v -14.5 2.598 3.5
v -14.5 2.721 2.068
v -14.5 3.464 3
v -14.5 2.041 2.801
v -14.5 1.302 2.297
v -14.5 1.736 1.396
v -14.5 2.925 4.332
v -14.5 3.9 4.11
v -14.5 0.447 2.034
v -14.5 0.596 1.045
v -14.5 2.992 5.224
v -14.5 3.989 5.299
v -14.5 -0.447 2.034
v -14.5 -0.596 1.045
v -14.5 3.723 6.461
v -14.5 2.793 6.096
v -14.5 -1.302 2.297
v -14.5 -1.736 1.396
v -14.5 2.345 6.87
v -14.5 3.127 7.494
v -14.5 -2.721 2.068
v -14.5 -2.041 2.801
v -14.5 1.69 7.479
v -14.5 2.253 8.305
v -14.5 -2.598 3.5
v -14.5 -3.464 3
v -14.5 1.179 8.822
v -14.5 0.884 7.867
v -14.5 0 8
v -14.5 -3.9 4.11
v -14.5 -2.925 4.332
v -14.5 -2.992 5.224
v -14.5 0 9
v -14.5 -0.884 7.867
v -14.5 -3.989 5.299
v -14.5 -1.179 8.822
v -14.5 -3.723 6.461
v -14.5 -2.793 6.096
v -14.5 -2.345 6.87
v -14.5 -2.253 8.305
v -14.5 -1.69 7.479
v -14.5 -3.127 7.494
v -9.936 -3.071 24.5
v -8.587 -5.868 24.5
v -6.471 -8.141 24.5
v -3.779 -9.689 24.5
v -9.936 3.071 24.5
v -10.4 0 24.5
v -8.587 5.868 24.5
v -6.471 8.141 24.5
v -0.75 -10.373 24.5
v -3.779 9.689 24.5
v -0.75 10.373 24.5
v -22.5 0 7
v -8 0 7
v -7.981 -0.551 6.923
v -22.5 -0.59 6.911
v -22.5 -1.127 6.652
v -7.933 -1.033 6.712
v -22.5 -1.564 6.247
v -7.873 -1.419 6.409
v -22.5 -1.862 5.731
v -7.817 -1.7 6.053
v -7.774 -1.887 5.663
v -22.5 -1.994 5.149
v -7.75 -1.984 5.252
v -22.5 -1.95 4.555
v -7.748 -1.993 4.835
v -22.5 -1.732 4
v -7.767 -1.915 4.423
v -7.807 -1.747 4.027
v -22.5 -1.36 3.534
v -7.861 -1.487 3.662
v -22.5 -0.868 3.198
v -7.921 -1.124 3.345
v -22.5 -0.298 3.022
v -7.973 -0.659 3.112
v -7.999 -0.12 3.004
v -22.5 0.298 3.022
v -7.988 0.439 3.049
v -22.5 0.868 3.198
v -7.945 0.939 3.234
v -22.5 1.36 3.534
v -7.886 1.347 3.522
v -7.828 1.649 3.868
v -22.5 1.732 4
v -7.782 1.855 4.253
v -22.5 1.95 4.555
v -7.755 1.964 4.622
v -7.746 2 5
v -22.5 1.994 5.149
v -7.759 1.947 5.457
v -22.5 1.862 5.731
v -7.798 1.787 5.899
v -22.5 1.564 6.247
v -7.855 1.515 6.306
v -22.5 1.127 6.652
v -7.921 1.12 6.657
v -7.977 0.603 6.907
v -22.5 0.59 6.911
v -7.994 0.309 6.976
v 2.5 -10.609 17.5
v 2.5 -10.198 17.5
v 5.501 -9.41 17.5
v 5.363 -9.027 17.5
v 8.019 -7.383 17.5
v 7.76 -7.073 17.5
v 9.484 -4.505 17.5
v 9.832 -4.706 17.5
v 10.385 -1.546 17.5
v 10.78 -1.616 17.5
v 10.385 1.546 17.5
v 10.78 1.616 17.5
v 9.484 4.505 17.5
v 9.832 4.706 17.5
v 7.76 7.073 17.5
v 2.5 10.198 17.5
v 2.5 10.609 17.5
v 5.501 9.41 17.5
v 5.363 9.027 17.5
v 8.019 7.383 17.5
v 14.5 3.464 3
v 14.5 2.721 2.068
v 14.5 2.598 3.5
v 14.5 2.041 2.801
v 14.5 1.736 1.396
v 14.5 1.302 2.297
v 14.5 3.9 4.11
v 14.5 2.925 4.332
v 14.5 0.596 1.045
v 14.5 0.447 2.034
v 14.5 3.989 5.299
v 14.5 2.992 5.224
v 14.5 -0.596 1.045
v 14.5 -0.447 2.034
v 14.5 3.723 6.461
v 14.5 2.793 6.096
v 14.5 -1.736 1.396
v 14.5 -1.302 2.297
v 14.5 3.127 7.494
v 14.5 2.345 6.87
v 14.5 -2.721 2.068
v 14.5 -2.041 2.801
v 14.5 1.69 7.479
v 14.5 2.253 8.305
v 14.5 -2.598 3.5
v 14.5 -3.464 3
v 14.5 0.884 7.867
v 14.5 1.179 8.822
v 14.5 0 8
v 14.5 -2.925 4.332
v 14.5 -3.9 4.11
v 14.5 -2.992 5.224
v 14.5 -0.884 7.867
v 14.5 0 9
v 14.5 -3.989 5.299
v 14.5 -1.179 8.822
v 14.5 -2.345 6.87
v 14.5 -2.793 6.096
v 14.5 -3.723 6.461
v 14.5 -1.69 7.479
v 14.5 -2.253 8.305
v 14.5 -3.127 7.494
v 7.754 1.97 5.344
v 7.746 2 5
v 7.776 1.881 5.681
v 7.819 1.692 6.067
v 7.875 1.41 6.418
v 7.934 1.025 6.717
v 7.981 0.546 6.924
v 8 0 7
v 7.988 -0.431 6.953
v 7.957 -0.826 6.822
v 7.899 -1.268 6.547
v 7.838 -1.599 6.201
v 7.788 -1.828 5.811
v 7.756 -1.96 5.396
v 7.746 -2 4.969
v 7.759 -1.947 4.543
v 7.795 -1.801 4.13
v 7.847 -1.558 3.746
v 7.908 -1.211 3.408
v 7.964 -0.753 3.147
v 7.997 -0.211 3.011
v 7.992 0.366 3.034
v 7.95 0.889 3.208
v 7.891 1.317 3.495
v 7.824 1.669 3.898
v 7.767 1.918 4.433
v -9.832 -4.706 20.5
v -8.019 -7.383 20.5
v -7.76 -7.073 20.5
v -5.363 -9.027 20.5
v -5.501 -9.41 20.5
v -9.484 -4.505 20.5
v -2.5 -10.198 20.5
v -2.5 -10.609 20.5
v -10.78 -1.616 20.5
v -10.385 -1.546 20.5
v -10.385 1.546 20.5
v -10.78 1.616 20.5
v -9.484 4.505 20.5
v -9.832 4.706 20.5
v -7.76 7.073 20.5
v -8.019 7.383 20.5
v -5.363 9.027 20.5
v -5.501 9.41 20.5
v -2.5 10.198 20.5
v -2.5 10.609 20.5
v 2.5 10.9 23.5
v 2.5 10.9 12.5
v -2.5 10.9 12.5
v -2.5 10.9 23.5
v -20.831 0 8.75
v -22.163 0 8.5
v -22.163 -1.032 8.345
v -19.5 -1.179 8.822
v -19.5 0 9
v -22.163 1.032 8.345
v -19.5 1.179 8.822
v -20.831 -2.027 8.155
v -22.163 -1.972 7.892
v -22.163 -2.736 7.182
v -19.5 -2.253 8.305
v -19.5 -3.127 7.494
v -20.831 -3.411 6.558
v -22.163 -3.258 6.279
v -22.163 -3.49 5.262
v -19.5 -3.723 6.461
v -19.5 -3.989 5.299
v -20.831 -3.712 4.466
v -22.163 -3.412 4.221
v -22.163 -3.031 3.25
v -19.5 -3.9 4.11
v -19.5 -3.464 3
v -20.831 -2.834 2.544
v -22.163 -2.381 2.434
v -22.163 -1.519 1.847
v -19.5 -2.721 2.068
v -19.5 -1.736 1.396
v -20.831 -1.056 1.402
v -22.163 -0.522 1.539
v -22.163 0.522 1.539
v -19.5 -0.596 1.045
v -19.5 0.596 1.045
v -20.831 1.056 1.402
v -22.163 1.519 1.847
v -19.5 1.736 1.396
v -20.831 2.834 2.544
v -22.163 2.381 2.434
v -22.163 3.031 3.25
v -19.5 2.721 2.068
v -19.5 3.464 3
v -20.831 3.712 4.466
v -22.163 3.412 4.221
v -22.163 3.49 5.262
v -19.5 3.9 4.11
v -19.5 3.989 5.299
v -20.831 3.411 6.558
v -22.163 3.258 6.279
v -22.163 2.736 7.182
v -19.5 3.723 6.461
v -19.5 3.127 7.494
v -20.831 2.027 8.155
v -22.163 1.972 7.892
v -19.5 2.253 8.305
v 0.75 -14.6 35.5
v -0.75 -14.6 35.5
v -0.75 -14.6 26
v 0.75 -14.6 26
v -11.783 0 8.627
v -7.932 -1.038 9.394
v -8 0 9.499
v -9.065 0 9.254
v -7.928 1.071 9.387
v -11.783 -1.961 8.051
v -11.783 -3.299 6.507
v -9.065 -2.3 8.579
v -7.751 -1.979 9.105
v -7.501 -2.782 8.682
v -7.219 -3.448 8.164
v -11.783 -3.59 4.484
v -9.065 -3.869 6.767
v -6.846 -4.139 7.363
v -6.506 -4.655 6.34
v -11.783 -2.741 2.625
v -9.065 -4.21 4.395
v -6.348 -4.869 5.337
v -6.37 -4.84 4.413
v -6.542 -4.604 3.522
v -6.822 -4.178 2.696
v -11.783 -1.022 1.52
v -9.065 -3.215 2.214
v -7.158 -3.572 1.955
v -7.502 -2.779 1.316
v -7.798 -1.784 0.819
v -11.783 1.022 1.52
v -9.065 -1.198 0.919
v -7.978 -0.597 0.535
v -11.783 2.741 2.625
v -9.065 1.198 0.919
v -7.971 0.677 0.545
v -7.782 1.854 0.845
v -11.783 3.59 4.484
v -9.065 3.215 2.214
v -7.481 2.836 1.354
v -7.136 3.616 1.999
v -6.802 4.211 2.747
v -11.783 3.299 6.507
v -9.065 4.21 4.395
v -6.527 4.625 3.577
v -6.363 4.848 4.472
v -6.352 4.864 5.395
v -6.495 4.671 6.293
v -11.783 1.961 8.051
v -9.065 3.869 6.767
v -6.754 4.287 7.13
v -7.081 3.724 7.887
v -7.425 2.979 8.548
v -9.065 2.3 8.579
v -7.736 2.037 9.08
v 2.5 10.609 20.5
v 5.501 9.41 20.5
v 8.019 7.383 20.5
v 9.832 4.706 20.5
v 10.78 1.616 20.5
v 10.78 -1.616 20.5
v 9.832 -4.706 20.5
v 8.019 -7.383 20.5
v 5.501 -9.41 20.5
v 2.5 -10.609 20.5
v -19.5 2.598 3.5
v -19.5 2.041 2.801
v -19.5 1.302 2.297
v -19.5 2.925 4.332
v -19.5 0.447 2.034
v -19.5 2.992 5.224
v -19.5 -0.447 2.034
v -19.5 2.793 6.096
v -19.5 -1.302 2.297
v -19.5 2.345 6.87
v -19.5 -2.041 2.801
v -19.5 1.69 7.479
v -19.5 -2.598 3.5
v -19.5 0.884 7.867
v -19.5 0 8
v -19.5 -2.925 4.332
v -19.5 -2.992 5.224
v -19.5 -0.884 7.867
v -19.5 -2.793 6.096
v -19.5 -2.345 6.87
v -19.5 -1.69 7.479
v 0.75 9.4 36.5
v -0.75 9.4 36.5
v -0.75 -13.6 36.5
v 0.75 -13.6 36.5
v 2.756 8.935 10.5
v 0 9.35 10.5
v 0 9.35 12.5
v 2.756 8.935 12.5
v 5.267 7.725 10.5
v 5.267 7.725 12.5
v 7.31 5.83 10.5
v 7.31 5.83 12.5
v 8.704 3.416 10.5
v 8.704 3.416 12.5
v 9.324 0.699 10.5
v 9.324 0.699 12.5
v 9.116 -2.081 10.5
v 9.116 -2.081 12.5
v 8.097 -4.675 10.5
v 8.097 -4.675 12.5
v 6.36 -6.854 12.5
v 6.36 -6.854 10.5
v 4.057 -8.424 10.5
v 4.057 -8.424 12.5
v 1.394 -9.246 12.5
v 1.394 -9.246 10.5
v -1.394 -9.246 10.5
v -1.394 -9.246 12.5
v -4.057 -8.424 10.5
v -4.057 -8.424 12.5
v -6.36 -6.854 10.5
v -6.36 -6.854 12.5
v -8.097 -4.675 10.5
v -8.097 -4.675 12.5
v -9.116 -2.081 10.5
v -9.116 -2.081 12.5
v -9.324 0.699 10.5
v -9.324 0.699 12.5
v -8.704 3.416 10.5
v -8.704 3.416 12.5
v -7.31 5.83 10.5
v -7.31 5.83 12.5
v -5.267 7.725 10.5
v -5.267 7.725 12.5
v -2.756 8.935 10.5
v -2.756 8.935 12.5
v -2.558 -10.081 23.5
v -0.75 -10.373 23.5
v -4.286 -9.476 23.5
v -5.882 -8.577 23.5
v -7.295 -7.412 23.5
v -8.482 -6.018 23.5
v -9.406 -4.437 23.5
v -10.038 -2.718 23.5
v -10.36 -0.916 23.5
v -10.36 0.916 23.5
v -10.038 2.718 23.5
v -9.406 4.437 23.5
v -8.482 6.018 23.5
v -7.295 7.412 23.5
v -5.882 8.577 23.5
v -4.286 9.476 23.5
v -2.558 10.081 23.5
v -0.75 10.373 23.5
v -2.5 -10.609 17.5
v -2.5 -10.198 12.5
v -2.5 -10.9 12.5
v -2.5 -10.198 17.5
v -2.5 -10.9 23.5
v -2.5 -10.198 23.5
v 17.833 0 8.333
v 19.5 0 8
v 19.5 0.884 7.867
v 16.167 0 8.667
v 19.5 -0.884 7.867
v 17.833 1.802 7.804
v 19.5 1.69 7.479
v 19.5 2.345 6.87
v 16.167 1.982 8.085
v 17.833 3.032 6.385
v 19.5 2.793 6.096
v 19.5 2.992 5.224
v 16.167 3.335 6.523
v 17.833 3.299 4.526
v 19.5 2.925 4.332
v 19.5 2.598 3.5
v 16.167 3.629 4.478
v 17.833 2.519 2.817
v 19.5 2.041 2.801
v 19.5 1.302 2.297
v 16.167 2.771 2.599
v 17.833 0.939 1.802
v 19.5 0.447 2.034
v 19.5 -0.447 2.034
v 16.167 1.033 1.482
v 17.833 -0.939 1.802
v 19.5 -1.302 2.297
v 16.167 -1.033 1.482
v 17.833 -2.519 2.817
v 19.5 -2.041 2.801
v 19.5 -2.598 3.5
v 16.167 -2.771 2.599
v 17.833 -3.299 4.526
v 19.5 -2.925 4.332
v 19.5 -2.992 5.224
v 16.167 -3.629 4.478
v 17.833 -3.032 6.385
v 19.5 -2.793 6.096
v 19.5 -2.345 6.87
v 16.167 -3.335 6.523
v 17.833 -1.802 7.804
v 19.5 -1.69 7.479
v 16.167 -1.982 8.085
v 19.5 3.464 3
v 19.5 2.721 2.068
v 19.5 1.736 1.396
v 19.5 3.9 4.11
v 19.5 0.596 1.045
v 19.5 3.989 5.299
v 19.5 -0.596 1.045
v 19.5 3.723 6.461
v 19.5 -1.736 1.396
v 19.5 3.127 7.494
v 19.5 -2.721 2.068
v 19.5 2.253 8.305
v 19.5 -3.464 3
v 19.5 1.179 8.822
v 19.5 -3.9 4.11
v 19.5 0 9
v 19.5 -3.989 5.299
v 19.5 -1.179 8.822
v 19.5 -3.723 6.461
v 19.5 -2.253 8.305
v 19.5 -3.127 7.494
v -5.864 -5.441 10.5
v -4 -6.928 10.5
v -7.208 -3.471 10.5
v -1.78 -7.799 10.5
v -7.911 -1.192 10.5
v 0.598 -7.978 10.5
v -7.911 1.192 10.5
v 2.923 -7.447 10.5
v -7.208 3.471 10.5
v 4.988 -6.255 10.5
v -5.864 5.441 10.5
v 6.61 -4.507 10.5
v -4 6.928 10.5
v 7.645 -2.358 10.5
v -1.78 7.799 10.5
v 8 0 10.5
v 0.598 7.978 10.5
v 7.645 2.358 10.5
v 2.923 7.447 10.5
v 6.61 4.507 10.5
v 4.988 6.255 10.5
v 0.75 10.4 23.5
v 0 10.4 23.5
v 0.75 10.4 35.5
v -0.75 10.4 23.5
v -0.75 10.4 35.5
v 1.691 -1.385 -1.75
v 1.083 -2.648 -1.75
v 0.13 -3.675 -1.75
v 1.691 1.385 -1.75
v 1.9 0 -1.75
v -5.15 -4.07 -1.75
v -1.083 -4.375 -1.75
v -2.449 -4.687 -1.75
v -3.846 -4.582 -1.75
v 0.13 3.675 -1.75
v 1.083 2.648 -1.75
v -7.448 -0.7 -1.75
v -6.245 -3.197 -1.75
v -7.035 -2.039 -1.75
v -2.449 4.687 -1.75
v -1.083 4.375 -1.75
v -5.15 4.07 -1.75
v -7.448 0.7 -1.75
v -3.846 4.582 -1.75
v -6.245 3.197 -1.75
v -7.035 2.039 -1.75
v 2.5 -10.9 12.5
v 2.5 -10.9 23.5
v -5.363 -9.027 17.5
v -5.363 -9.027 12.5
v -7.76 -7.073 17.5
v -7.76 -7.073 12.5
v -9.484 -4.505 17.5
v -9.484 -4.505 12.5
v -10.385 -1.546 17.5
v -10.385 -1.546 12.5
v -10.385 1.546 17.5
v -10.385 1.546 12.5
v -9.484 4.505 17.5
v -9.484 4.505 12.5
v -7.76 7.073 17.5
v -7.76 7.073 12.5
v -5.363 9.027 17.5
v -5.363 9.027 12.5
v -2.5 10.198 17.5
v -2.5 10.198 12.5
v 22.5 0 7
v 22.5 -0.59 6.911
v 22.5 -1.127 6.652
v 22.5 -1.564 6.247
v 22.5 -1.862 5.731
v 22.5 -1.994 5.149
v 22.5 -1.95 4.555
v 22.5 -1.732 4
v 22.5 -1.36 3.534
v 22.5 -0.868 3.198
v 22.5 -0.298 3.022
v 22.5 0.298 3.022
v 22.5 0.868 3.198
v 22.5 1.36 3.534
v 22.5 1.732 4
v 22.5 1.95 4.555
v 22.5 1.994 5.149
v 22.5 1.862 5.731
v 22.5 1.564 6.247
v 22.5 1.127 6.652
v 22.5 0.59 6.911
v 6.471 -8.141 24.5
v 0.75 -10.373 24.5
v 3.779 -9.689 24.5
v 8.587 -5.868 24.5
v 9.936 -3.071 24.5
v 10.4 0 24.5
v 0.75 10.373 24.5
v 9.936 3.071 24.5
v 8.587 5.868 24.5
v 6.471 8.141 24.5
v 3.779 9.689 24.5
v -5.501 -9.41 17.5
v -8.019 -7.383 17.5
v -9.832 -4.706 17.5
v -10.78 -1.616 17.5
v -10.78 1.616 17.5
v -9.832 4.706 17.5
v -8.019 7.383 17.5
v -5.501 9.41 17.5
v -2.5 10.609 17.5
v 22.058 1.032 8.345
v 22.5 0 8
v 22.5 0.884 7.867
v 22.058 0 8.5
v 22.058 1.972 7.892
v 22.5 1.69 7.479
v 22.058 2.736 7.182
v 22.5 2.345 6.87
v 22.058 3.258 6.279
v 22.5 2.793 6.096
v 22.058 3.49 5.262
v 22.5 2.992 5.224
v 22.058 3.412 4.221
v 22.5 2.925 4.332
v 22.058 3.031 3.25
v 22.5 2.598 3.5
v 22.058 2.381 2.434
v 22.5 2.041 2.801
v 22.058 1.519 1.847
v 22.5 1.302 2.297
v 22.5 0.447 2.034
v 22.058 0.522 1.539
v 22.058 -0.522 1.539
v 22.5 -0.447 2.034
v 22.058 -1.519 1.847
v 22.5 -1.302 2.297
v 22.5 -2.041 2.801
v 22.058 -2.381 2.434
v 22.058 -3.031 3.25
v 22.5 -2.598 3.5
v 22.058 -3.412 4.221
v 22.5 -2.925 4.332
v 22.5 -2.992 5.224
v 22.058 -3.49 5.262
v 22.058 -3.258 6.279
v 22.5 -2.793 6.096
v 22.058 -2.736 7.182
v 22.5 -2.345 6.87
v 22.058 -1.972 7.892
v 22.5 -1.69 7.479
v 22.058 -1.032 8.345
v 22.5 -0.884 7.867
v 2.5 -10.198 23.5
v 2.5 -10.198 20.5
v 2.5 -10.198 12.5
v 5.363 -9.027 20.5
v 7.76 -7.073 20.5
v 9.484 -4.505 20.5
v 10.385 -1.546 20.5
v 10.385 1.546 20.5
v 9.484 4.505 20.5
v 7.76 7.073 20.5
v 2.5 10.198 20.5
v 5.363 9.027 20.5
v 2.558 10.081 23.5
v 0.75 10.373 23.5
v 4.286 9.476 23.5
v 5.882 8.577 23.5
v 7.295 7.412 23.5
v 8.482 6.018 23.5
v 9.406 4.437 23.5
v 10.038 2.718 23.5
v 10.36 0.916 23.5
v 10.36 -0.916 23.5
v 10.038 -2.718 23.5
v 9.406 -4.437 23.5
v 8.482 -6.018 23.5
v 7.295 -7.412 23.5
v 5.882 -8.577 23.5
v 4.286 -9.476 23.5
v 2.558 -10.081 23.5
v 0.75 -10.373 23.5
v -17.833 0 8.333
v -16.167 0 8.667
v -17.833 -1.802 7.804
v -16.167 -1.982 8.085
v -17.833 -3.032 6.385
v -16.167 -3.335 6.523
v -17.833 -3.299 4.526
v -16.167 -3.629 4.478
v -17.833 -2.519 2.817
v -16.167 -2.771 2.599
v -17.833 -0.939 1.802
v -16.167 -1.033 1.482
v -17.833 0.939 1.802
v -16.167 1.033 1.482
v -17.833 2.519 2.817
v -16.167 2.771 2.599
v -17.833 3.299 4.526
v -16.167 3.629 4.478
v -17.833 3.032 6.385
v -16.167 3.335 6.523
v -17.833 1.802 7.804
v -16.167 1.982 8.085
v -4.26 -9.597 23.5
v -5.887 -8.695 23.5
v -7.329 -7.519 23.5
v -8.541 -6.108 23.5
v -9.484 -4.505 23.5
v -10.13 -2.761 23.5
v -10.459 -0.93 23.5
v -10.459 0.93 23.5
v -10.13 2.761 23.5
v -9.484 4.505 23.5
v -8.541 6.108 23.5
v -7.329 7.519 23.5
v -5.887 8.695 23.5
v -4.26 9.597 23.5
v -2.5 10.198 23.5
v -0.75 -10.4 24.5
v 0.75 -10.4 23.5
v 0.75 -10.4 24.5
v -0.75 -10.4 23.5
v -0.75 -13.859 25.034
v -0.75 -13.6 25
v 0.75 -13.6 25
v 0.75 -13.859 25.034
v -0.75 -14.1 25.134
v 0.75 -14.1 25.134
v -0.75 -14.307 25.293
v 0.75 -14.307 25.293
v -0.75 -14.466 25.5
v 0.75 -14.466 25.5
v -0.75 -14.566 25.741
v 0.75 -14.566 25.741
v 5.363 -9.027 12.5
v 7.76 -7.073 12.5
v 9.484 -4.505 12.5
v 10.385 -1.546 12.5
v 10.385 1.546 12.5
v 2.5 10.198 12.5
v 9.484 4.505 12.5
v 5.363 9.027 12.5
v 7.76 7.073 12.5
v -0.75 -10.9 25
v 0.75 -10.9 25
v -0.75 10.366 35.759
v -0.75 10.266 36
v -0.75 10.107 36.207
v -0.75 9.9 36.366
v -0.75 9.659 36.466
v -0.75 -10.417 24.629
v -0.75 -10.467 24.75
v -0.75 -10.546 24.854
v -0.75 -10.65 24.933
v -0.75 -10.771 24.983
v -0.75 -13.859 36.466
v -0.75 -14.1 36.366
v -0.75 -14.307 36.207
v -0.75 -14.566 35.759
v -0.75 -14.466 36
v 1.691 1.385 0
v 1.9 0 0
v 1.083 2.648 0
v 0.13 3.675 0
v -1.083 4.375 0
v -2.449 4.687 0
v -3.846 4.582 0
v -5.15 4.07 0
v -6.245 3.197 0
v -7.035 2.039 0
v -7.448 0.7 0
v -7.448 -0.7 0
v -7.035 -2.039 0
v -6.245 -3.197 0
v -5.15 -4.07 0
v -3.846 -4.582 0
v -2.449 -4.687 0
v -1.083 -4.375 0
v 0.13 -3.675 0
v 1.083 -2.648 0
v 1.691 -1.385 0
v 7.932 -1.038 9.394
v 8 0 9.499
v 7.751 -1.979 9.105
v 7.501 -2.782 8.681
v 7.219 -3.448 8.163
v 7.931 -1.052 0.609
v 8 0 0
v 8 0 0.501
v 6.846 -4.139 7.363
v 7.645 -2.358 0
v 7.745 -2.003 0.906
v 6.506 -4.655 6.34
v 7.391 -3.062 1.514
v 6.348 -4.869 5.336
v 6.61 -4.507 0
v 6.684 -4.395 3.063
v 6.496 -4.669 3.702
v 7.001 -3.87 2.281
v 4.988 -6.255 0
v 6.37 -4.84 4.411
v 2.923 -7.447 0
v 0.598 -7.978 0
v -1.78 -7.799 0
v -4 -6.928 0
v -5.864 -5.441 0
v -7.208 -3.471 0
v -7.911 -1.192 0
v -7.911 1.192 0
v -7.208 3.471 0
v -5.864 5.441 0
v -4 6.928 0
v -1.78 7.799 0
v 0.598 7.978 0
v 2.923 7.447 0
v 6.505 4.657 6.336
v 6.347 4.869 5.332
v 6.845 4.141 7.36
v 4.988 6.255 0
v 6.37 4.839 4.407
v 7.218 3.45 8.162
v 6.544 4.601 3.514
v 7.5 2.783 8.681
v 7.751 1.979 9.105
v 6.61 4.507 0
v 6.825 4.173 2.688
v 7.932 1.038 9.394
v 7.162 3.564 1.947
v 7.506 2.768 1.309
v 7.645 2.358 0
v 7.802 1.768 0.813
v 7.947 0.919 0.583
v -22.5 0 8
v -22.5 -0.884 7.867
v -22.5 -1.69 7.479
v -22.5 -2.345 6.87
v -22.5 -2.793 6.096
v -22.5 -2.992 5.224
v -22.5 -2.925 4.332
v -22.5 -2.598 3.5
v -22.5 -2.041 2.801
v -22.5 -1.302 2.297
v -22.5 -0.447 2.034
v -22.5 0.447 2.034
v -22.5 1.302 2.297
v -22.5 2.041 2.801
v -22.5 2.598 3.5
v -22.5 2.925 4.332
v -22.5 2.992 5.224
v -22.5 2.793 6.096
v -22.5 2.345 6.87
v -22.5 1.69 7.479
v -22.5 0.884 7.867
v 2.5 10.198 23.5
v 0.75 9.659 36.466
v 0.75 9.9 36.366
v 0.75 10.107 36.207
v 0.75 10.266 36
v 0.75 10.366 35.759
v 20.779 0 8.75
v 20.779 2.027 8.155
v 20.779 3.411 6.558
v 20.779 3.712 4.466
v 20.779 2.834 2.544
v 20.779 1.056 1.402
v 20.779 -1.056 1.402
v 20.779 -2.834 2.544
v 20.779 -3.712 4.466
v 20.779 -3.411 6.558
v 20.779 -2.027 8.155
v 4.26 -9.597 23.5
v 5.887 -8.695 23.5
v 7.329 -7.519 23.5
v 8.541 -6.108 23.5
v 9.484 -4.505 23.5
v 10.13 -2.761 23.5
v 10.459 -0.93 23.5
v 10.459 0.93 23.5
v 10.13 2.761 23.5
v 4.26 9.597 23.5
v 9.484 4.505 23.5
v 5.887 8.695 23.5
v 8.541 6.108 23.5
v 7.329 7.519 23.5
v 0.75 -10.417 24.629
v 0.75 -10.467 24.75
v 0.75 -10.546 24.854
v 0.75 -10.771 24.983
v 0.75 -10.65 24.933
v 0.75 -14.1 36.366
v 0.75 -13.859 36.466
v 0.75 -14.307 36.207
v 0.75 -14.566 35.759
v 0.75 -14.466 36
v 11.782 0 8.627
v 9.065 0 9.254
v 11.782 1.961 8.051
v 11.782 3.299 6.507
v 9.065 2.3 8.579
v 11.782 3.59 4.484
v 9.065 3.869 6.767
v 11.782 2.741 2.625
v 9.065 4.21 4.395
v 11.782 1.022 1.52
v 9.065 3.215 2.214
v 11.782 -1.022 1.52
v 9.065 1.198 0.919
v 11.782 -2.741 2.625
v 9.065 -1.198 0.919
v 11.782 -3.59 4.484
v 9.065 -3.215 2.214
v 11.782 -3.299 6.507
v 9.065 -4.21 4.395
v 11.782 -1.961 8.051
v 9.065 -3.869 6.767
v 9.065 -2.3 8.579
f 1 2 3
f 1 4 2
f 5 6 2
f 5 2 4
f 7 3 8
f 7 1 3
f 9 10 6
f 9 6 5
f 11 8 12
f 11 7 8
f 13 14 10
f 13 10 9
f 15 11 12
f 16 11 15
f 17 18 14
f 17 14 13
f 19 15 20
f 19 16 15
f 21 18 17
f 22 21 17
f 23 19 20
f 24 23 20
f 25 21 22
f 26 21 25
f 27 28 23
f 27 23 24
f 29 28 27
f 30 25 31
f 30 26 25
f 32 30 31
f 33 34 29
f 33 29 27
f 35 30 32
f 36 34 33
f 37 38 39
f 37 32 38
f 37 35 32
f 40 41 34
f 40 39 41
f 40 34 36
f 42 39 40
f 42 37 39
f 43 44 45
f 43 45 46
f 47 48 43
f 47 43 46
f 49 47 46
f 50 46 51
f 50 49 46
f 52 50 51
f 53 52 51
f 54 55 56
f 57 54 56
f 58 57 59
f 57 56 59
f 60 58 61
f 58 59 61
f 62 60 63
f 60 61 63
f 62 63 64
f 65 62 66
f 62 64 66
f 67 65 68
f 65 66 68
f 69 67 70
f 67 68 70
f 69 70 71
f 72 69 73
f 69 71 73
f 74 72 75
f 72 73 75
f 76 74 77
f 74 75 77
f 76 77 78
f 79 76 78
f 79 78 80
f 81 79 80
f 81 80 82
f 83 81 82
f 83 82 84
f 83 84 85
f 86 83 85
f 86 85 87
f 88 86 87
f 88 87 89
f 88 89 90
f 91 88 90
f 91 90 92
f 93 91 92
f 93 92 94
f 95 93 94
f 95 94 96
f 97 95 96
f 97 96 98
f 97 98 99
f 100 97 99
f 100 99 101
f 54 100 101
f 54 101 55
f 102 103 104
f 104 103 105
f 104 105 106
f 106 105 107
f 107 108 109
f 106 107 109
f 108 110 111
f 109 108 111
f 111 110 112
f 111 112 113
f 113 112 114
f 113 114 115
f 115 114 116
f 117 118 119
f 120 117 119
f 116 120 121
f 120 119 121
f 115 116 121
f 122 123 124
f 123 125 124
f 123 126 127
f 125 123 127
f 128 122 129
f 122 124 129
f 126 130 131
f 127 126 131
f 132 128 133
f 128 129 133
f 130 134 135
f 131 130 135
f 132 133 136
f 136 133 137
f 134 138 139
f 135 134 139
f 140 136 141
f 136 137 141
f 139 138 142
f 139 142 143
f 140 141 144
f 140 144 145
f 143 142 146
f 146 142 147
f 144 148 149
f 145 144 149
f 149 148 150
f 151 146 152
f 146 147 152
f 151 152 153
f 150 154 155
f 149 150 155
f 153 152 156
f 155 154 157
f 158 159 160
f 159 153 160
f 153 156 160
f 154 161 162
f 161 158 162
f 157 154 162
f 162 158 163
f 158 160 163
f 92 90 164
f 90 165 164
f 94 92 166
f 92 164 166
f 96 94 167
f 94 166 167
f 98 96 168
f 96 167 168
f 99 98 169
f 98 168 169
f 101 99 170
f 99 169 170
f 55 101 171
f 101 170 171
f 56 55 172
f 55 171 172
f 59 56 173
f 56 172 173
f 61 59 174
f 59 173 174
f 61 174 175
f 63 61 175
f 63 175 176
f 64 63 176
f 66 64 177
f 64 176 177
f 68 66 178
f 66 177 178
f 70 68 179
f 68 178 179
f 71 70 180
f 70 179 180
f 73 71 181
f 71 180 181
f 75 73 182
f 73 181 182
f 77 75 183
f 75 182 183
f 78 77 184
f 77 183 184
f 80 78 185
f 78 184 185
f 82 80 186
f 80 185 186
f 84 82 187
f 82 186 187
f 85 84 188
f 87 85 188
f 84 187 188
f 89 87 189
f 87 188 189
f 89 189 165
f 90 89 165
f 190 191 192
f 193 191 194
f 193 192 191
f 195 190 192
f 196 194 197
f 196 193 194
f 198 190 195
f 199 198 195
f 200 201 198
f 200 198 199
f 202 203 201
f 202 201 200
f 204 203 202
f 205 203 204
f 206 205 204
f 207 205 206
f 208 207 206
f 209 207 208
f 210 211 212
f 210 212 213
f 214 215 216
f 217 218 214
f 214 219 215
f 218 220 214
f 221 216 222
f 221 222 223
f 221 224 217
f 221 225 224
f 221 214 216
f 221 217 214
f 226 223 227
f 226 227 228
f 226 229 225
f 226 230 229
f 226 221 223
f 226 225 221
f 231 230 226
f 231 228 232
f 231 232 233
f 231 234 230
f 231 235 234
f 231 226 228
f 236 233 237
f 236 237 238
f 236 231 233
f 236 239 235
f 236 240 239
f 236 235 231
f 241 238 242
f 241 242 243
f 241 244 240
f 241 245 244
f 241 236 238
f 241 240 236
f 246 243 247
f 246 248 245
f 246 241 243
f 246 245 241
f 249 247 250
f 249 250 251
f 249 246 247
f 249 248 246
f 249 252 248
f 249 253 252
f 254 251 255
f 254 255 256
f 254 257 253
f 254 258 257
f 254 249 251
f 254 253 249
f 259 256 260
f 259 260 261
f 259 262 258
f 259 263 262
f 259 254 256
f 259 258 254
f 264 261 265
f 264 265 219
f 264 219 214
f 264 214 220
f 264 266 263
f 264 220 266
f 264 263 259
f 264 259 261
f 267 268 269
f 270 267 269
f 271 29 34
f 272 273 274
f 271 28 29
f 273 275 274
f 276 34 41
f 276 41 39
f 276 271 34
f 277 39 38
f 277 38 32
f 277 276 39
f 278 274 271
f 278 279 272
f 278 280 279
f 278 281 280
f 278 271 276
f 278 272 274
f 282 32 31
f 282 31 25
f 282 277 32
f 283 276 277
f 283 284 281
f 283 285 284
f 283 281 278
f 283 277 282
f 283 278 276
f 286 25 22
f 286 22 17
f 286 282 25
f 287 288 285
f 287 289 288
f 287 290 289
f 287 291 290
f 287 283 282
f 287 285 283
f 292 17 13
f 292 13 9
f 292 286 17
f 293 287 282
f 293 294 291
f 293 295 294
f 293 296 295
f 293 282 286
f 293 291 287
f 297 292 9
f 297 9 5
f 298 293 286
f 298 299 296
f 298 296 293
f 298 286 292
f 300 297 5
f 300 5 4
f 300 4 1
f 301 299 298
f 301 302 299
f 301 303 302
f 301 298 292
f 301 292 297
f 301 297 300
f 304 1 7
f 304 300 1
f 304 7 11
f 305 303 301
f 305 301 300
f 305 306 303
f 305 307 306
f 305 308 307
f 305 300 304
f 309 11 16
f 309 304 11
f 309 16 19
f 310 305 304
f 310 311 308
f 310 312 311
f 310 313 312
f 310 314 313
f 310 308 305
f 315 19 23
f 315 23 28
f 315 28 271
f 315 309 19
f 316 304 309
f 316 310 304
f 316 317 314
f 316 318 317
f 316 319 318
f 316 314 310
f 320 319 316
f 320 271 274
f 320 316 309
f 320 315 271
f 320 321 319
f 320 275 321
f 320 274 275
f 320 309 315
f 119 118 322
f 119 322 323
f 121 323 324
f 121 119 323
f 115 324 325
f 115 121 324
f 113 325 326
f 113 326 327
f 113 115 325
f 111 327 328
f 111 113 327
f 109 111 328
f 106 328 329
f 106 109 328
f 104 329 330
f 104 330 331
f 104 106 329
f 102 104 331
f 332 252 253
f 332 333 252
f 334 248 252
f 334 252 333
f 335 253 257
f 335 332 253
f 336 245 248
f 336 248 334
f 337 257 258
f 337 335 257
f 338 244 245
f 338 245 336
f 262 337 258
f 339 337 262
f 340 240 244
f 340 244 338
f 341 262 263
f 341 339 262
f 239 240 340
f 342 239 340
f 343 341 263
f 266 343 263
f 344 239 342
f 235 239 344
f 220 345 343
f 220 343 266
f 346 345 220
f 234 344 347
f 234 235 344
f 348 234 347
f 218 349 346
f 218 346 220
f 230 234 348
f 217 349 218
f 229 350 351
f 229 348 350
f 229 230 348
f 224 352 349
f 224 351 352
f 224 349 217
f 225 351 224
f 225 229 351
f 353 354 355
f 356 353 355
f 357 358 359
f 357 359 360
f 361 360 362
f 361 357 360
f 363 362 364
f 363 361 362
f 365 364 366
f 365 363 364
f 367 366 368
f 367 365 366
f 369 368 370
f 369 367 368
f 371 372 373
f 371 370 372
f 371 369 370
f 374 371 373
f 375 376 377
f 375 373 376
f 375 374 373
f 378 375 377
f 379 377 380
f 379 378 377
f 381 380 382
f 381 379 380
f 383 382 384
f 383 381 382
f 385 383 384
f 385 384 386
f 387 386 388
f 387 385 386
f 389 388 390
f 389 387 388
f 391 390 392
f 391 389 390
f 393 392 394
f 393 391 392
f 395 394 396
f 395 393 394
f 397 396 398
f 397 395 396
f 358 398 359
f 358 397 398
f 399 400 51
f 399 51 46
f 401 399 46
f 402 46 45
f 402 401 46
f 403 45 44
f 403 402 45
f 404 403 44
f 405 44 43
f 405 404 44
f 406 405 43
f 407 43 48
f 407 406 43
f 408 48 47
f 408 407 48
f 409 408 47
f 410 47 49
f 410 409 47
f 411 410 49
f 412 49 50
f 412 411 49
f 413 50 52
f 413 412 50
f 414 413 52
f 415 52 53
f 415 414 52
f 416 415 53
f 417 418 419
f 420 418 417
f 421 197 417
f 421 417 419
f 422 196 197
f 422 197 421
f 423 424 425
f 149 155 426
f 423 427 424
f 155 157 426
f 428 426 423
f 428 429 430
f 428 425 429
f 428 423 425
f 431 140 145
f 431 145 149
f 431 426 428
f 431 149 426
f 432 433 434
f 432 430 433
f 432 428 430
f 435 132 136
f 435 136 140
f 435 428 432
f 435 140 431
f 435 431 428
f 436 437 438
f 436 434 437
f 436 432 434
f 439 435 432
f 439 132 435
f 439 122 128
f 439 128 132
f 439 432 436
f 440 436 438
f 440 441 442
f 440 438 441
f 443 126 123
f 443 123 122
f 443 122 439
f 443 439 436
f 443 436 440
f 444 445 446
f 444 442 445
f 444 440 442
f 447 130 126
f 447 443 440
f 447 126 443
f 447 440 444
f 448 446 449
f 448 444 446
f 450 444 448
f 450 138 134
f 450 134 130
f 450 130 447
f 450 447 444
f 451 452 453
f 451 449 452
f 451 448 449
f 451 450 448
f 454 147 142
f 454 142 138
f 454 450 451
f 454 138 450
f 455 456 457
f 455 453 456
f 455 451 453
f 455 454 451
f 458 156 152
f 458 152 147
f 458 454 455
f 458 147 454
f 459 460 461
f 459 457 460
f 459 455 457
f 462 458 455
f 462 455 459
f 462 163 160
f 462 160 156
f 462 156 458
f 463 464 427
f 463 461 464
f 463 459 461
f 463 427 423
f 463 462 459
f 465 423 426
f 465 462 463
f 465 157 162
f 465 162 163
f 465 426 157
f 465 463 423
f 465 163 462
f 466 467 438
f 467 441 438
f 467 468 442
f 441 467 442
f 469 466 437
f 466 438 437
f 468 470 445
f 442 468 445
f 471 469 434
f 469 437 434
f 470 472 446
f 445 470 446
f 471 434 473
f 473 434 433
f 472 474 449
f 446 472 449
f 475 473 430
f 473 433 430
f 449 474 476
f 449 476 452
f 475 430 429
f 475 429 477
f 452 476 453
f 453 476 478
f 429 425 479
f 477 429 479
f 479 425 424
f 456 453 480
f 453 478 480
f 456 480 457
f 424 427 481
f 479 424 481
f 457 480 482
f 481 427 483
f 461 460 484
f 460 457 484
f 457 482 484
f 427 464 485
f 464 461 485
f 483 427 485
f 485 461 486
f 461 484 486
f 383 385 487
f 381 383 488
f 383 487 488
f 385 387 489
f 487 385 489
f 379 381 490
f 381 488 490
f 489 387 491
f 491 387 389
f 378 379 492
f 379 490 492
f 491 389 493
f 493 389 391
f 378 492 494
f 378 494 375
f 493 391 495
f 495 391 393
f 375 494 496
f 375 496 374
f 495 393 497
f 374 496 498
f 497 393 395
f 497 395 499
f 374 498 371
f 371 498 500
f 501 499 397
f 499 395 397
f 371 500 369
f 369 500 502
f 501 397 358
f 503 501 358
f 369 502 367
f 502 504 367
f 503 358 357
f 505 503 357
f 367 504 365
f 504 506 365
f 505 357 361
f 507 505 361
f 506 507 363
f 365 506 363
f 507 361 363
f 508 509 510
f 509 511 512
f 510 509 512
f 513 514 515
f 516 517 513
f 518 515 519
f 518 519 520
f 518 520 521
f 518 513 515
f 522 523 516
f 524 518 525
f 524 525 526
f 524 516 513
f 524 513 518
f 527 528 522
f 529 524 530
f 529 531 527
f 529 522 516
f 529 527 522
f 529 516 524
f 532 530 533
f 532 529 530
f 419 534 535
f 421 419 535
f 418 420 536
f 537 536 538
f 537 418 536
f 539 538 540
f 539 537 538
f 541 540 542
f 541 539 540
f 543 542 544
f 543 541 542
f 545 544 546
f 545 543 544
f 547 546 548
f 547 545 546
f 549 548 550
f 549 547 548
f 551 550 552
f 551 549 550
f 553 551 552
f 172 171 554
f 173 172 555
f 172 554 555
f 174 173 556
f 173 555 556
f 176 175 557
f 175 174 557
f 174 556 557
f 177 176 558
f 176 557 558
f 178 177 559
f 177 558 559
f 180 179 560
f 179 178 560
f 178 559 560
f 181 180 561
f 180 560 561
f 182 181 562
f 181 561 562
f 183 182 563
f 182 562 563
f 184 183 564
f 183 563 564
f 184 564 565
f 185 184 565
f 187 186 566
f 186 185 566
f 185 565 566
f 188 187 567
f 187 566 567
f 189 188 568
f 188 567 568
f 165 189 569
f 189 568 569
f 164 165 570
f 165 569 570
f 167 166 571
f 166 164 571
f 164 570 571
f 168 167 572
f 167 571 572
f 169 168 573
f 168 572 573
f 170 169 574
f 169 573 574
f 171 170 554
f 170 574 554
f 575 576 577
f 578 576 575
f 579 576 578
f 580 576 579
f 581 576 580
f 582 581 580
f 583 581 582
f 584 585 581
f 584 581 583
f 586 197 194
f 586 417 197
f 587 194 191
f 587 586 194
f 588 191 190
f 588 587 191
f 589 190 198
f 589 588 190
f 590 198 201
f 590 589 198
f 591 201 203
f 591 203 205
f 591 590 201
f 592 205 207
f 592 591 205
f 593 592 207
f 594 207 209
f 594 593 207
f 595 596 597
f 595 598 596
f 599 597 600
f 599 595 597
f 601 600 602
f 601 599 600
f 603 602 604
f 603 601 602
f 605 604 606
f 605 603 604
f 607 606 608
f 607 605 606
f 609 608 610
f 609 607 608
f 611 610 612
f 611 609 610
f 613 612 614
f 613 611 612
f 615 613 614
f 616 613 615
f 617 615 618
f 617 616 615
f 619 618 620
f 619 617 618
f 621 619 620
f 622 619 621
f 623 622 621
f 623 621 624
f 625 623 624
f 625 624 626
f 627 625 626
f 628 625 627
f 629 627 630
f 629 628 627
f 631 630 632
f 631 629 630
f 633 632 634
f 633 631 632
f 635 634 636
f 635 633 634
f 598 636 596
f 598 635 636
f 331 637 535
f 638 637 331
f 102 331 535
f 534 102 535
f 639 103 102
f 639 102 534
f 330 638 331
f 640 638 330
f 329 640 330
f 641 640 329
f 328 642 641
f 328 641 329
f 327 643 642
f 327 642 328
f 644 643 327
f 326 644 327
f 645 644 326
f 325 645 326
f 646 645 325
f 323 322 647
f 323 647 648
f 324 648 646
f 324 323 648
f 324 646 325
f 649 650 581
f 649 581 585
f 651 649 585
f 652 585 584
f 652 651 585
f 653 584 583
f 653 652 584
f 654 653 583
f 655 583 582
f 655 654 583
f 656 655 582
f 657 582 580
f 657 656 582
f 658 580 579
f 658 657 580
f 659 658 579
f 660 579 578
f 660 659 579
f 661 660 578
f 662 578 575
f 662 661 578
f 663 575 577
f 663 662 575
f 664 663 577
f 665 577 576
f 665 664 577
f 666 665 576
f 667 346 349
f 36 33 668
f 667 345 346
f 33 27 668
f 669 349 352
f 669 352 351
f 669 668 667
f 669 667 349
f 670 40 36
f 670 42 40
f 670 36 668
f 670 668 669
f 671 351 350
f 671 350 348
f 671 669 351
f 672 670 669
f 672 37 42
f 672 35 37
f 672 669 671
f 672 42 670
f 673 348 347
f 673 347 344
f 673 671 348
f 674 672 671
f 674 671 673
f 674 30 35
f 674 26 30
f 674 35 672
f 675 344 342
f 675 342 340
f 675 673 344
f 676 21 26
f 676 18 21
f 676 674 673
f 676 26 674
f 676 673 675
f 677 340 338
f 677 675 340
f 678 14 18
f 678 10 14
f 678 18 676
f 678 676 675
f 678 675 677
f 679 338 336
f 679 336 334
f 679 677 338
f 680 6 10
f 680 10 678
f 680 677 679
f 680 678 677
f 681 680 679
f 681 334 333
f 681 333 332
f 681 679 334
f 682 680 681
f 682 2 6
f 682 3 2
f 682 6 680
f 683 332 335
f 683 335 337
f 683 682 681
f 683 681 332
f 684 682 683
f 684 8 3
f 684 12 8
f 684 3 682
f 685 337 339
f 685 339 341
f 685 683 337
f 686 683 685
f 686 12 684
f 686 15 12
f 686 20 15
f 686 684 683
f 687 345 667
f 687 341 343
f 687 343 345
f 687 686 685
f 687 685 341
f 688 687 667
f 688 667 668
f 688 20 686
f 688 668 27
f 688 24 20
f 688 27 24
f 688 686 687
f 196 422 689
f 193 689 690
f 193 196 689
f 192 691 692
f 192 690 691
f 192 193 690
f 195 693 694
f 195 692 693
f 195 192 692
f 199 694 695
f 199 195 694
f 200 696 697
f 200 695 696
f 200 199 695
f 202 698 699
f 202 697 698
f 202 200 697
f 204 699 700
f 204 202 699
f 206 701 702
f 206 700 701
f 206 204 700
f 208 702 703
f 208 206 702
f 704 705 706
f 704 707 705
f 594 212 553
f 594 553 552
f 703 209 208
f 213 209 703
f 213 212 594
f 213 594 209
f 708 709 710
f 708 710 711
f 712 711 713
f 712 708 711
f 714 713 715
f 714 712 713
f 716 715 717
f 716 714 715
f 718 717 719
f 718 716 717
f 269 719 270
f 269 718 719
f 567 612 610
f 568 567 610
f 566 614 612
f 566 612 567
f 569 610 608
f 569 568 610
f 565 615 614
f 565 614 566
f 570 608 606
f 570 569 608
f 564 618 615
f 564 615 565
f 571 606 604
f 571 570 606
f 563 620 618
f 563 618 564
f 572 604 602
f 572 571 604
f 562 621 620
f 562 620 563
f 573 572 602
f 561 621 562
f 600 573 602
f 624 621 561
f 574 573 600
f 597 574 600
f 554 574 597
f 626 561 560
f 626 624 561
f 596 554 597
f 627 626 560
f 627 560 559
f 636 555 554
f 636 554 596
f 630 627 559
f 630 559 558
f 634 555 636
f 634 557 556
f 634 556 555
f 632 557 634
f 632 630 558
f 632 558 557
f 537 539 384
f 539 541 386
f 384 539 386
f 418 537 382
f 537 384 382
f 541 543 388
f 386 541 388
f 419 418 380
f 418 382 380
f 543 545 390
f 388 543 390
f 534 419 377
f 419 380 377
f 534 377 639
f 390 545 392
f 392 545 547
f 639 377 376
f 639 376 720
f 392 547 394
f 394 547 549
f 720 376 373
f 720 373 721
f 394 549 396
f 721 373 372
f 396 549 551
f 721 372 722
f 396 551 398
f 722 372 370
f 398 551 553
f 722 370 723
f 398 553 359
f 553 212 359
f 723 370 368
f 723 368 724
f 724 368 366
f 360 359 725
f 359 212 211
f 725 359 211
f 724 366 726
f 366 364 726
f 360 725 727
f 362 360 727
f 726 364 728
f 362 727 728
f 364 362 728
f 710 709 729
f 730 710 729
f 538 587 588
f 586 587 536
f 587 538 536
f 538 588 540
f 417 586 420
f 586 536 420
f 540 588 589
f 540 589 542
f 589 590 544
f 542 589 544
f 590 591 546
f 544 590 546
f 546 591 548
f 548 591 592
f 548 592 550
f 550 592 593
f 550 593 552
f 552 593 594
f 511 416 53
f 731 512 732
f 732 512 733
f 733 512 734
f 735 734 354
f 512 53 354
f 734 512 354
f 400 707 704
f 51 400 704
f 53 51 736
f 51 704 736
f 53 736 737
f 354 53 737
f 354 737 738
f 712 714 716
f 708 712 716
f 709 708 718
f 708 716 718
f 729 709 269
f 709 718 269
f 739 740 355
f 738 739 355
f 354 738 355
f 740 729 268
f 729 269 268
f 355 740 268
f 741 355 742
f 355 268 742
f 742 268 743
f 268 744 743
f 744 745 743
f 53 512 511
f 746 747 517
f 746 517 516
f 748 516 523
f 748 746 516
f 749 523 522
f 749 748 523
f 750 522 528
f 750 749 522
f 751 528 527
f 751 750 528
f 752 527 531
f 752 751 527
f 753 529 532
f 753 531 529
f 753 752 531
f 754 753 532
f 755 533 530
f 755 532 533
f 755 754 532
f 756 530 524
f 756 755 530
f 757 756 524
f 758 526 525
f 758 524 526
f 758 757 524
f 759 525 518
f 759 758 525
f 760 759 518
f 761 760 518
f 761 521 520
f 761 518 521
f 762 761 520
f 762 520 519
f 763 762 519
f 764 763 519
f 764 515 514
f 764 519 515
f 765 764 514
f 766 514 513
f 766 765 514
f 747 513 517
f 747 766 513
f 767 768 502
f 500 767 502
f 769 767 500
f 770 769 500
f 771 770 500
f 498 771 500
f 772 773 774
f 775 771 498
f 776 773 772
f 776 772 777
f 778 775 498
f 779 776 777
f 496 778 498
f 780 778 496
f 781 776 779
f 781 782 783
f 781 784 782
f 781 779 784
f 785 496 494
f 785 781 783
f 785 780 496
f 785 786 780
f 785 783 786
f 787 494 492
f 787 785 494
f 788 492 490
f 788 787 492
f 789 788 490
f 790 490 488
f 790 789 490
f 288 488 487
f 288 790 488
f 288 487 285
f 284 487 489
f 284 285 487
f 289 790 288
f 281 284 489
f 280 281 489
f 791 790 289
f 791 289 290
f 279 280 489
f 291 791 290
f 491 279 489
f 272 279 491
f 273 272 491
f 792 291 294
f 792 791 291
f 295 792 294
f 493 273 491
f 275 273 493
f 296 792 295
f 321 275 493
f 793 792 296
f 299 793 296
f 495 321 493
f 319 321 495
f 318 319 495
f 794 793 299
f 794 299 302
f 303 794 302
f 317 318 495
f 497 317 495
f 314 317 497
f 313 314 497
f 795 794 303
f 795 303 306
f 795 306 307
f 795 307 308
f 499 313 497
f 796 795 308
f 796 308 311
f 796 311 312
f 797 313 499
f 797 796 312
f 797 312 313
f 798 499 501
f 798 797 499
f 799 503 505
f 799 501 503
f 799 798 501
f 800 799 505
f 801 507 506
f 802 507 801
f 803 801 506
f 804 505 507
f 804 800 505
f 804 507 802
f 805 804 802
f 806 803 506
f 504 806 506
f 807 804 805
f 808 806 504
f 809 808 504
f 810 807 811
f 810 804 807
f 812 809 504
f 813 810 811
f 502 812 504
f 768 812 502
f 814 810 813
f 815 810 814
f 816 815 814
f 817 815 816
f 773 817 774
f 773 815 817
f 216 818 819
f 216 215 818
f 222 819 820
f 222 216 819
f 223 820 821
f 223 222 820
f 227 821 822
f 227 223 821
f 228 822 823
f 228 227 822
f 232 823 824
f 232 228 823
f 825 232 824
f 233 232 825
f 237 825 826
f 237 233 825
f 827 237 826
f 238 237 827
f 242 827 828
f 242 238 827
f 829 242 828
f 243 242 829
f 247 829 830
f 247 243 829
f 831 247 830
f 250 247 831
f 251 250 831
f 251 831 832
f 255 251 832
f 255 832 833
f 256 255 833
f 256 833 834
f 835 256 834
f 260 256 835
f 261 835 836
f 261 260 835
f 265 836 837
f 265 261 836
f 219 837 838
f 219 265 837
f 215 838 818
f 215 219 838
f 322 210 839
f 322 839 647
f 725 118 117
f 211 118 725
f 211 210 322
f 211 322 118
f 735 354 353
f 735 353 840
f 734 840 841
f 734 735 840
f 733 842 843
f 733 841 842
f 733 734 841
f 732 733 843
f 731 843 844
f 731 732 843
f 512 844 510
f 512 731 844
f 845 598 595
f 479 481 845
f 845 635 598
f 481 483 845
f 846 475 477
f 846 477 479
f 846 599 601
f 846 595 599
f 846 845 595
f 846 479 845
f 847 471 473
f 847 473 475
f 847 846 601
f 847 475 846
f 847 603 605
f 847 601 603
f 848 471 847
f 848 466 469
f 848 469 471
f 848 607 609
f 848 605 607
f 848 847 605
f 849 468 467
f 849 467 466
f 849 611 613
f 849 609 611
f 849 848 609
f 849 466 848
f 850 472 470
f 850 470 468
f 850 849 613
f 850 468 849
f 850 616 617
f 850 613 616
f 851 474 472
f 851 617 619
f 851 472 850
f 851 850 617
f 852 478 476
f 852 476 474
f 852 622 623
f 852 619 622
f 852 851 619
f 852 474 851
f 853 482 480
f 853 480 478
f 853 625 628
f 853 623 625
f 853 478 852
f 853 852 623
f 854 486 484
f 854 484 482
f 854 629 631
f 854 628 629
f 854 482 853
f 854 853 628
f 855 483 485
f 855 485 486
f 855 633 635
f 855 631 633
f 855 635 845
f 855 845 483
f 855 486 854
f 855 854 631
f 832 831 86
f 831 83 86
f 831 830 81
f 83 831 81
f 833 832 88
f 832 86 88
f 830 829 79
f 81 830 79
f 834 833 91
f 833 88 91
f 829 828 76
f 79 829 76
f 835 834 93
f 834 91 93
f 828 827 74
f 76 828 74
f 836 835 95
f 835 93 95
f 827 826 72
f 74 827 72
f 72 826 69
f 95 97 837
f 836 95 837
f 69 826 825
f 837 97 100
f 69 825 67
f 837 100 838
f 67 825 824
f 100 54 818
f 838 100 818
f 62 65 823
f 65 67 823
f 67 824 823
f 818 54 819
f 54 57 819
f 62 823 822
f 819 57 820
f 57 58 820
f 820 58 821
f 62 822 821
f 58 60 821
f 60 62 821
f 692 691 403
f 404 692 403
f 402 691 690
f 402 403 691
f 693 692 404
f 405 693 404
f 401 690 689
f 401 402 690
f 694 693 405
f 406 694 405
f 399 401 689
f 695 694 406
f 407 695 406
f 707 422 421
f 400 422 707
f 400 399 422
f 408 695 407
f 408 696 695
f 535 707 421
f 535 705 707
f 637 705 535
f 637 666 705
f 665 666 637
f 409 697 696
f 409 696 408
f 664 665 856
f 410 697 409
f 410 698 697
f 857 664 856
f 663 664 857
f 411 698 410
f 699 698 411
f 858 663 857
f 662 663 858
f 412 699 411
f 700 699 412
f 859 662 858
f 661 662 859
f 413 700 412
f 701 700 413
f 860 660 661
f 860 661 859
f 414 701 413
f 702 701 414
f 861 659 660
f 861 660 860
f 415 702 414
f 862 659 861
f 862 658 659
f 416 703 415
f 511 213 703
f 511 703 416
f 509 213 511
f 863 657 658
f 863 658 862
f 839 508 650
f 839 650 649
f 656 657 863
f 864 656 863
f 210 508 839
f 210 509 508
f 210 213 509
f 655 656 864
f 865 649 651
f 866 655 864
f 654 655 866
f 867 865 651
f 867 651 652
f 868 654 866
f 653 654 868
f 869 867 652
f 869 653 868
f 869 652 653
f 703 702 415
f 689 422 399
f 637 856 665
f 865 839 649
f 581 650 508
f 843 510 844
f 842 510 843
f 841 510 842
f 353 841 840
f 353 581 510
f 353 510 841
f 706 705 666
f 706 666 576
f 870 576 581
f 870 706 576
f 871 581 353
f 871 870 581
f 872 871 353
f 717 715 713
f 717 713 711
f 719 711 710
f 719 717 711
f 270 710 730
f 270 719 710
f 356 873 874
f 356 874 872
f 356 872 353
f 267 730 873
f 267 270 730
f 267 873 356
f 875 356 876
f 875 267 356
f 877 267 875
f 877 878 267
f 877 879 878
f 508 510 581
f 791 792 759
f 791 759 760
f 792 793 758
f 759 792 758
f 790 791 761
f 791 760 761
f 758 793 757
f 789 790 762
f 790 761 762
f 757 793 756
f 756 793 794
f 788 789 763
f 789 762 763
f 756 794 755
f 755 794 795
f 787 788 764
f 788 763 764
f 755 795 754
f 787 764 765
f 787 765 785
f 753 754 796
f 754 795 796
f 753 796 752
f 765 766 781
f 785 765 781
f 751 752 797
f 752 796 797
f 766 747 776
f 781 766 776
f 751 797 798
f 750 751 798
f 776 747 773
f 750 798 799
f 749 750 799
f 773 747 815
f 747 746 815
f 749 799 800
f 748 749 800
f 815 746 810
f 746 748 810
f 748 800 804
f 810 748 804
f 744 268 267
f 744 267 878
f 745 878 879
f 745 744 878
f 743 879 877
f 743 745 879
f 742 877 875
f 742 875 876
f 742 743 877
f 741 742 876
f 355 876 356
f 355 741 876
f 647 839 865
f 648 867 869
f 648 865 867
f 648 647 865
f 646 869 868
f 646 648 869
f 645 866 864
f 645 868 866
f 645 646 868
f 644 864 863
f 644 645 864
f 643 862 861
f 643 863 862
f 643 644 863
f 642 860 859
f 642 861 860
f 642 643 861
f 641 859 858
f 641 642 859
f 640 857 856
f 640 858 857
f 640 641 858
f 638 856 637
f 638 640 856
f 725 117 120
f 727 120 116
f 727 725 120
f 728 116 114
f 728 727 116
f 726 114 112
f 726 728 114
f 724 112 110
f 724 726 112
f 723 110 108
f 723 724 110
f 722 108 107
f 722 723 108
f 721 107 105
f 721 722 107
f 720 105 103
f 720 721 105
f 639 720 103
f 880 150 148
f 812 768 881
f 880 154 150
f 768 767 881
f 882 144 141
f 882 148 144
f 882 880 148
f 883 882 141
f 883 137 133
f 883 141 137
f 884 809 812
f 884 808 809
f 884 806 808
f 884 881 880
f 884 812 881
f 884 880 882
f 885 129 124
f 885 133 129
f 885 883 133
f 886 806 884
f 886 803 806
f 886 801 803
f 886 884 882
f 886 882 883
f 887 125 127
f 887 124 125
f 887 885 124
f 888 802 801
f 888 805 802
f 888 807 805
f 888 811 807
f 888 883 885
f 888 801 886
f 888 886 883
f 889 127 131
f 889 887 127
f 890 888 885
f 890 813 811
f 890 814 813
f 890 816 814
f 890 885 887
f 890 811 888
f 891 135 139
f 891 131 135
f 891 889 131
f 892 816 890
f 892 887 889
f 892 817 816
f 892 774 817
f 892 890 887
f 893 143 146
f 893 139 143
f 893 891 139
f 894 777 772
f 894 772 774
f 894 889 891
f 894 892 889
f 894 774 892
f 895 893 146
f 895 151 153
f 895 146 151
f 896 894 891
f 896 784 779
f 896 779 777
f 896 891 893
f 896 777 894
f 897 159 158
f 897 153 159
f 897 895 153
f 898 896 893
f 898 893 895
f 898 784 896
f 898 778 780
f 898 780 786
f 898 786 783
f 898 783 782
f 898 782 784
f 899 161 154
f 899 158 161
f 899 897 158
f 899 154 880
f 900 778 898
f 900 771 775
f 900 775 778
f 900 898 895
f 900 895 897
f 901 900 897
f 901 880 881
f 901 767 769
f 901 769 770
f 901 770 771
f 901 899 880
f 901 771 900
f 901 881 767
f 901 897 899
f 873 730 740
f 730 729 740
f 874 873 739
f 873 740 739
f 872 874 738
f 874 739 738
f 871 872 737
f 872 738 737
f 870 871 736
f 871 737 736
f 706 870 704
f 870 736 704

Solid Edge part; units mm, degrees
sketch "Sketch1" plane through (0, 0, 0) normal (0, 0, 1) x (1, 0, 0)
  circle A0 centre (0, 0) radius 8
extrude "Protrusion1" add sketch "Sketch1" along normal blind 10.5
sketch "Sketch2" plane through (0, 0, 10.5) normal (0, 0, 1) x (0, 1, 0)
  circle A0 centre (0, 0) radius 9.35
extrude "Extrusionsausprägung_2" add sketch "Sketch2" along normal blind 2
sketch "Sketch3" plane through (0, 0, 12.5) normal (0, 0, 1) x (0, 1, 0)
  circle A0 centre (0, 0) radius 10.5
extrude "Extrusionsausprägung_3" add sketch "Sketch3" along normal blind 11
sketch "Sketch4" plane through (0, 0, 17.5) normal (0, 0, 1) x (0, 1, 0)
  circle A0 centre (0, 0) radius 10.9
extrude "Extrusionsausprägung_4" add sketch "Sketch4" along normal blind 3
sketch "Sketch5" plane through (0, -10.5, 0) normal (0, -1, 0) x (1, 0, 0)
  line L0 (0, 23.5) -> (2.5, 23.5)
  line L1 (2.5, 23.5) -> (2.5, 12.5)
  line L2 (2.5, 12.5) -> (-2.5, 12.5)
  line L3 (-2.5, 12.5) -> (-2.5, 23.5)
  line L4 (-2.5, 23.5) -> (0, 23.5)
extrude "Extrusionsausprägung_5" add sketch "Sketch5" along normal mid plane 0.8
sketch "Sketch6" plane through (0, 10.5, 0) normal (0, -1, 0) x (1, 0, 0)
  line L0 (-2.5, 23.5) -> (2.5, 23.5)
  line L1 (2.5, 23.5) -> (2.5, 12.5)
  line L2 (2.5, 12.5) -> (-2.5, 12.5)
  line L3 (-2.5, 12.5) -> (-2.5, 23.5)
extrude "Extrusionsausprägung_6" add sketch "Sketch6" along normal mid plane 0.8
sketch "Sketch7" plane through (0, 0, 23.5) normal (0, 0, 1) x (0, 1, 0)
  circle A0 centre (0, 0) radius 10.4
extrude "Extrusionsausprägung_7" add sketch "Sketch7" along normal mid plane 2
sketch "Sketch8" plane through (0, 0, 0) normal (1, 0, 0) x (0, 1, 0)
  line L0 (0, 23.5) -> (10.4, 23.5)
  line L1 (10.4, 23.5) -> (10.4, 35.5)
  arc A0 (10.4, 35.5) -> (9.4, 36.5) centre (9.4, 35.5) ccw
  line L2 (9.4, 36.5) -> (-13.6, 36.5)
  arc A1 (-14.6, 35.5) -> (-13.6, 36.5) centre (-13.6, 35.5) cw
  line L3 (-14.6, 35.5) -> (-14.6, 26)
  arc A2 (-14.6, 26) -> (-13.6, 25) centre (-13.6, 26) ccw
  line L4 (-13.6, 25) -> (-10.9, 25)
  arc A3 (-10.9, 25) -> (-10.4, 24.5) centre (-10.9, 24.5) cw
  line L5 (-10.4, 23.5) -> (-10.4, 24.5)
  line L6 (0, 23.5) -> (-10.4, 23.5)
extrude "Extrusionsausprägung_10" add sketch "Sketch8" along normal mid plane 1.5
sketch "Sketch9" plane through (0, 0, 0) normal (0, -1, 0) x (1, 0, 0)
  line L0 (22.5, 7) -> (22.5, 8)
  line L1 (22.5, 8) -> (22.0581, 8.5)
  line L2 (19.5, 9) -> (22.0581, 8.5)
  line L3 (19.5, 8) -> (19.5, 9)
  line L4 (14.5, 9) -> (19.5, 8)
  line L5 (14.5, 9) -> (14.5, 8)
  line L6 (14.5, 8) -> (5.2197, 10.1408)
  line L7 (5.2197, 10.1408) -> (-5.572, 10.0596)
  line L8 (-14.5, 8) -> (-5.572, 10.0596)
  line L9 (-14.5, 8) -> (-14.5, 9)
  line L10 (-14.5, 9) -> (-19.5, 8)
  line L11 (-19.5, 8) -> (-19.5, 9)
  line L12 (-19.5, 9) -> (-22.1628, 8.5)
  line L13 (-22.1628, 8.5) -> (-22.5, 8)
  line L14 (-22.5, 7) -> (-22.5, 8)
  line L15 (-22.5, 7) -> (22.5, 7)
revolve "RevolvedProtrusion1" add sketch "Sketch9" angle 360 about axis through (0, 0, 5) along (1, 0, 0)
sketch "Sketch10" plane through (22.5, 0, 5) normal (1, 0, 0) x (0, 1, 0)
  circle A0 centre (0, 0) radius 2
extrude "Cutout1" cut sketch "Sketch10" against normal blind 49.253
sketch "Sketch11" plane through (0, 0, 0) normal (0, 0, -1) x (1, 0, 0)
  line L0 (-1.7342, 3.7694) -> (-7.0229, 0.602)
  line L1 (-7.0229, 0.602) -> (-5.7187, -2.8522)
  line L2 (-5.7187, -2.8522) -> (2.9095, -3.9271)
  line L3 (2.9095, -3.9271) -> (6.9799, -0.516)
  line L4 (6.9799, -0.516) -> (4.9447, 3.4971)
  line L5 (4.9447, 3.4971) -> (-1.7342, 3.7694)
extrude "Extrusionsausschnitt_2" cut sketch "Sketch11" along normal blind 1.4314
sketch "Sketch12" plane through (0, 0, 0) normal (0, 0, -1) x (1, 0, 0)
  circle A0 centre (-2.8, 0) radius 4.7
extrude "Protrusion2" add sketch "Sketch12" along normal mid plane 3.5
